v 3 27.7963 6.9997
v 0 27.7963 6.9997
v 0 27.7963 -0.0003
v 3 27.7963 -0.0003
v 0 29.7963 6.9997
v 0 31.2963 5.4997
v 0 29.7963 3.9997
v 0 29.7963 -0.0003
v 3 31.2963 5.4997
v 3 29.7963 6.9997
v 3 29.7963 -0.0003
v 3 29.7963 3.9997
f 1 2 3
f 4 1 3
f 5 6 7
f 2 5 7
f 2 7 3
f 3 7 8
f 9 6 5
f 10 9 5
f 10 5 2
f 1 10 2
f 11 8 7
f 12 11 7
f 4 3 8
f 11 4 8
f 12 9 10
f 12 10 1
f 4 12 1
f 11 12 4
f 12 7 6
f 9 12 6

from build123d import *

# Parameters (mm, degrees)
BOSS_EXTRUDE1_DEPTH = 3


with BuildPart() as part:
    # Sketch2 → Boss-Extrude1 (new body)
    with BuildSketch(Plane(origin=(0, 0, 0), x_dir=(0, 0, -1), z_dir=(1, 0, 0))):
        Polygon((0.000317111, 27.796332929), (0.000317111, 29.796332929), (-3.999682889, 29.796332929), (-5.499682889, 31.296332929), (-6.999682889, 29.796332929), (-6.999682889, 27.796332929), align=None)
    extrude(amount=BOSS_EXTRUDE1_DEPTH)


solid = part.part
